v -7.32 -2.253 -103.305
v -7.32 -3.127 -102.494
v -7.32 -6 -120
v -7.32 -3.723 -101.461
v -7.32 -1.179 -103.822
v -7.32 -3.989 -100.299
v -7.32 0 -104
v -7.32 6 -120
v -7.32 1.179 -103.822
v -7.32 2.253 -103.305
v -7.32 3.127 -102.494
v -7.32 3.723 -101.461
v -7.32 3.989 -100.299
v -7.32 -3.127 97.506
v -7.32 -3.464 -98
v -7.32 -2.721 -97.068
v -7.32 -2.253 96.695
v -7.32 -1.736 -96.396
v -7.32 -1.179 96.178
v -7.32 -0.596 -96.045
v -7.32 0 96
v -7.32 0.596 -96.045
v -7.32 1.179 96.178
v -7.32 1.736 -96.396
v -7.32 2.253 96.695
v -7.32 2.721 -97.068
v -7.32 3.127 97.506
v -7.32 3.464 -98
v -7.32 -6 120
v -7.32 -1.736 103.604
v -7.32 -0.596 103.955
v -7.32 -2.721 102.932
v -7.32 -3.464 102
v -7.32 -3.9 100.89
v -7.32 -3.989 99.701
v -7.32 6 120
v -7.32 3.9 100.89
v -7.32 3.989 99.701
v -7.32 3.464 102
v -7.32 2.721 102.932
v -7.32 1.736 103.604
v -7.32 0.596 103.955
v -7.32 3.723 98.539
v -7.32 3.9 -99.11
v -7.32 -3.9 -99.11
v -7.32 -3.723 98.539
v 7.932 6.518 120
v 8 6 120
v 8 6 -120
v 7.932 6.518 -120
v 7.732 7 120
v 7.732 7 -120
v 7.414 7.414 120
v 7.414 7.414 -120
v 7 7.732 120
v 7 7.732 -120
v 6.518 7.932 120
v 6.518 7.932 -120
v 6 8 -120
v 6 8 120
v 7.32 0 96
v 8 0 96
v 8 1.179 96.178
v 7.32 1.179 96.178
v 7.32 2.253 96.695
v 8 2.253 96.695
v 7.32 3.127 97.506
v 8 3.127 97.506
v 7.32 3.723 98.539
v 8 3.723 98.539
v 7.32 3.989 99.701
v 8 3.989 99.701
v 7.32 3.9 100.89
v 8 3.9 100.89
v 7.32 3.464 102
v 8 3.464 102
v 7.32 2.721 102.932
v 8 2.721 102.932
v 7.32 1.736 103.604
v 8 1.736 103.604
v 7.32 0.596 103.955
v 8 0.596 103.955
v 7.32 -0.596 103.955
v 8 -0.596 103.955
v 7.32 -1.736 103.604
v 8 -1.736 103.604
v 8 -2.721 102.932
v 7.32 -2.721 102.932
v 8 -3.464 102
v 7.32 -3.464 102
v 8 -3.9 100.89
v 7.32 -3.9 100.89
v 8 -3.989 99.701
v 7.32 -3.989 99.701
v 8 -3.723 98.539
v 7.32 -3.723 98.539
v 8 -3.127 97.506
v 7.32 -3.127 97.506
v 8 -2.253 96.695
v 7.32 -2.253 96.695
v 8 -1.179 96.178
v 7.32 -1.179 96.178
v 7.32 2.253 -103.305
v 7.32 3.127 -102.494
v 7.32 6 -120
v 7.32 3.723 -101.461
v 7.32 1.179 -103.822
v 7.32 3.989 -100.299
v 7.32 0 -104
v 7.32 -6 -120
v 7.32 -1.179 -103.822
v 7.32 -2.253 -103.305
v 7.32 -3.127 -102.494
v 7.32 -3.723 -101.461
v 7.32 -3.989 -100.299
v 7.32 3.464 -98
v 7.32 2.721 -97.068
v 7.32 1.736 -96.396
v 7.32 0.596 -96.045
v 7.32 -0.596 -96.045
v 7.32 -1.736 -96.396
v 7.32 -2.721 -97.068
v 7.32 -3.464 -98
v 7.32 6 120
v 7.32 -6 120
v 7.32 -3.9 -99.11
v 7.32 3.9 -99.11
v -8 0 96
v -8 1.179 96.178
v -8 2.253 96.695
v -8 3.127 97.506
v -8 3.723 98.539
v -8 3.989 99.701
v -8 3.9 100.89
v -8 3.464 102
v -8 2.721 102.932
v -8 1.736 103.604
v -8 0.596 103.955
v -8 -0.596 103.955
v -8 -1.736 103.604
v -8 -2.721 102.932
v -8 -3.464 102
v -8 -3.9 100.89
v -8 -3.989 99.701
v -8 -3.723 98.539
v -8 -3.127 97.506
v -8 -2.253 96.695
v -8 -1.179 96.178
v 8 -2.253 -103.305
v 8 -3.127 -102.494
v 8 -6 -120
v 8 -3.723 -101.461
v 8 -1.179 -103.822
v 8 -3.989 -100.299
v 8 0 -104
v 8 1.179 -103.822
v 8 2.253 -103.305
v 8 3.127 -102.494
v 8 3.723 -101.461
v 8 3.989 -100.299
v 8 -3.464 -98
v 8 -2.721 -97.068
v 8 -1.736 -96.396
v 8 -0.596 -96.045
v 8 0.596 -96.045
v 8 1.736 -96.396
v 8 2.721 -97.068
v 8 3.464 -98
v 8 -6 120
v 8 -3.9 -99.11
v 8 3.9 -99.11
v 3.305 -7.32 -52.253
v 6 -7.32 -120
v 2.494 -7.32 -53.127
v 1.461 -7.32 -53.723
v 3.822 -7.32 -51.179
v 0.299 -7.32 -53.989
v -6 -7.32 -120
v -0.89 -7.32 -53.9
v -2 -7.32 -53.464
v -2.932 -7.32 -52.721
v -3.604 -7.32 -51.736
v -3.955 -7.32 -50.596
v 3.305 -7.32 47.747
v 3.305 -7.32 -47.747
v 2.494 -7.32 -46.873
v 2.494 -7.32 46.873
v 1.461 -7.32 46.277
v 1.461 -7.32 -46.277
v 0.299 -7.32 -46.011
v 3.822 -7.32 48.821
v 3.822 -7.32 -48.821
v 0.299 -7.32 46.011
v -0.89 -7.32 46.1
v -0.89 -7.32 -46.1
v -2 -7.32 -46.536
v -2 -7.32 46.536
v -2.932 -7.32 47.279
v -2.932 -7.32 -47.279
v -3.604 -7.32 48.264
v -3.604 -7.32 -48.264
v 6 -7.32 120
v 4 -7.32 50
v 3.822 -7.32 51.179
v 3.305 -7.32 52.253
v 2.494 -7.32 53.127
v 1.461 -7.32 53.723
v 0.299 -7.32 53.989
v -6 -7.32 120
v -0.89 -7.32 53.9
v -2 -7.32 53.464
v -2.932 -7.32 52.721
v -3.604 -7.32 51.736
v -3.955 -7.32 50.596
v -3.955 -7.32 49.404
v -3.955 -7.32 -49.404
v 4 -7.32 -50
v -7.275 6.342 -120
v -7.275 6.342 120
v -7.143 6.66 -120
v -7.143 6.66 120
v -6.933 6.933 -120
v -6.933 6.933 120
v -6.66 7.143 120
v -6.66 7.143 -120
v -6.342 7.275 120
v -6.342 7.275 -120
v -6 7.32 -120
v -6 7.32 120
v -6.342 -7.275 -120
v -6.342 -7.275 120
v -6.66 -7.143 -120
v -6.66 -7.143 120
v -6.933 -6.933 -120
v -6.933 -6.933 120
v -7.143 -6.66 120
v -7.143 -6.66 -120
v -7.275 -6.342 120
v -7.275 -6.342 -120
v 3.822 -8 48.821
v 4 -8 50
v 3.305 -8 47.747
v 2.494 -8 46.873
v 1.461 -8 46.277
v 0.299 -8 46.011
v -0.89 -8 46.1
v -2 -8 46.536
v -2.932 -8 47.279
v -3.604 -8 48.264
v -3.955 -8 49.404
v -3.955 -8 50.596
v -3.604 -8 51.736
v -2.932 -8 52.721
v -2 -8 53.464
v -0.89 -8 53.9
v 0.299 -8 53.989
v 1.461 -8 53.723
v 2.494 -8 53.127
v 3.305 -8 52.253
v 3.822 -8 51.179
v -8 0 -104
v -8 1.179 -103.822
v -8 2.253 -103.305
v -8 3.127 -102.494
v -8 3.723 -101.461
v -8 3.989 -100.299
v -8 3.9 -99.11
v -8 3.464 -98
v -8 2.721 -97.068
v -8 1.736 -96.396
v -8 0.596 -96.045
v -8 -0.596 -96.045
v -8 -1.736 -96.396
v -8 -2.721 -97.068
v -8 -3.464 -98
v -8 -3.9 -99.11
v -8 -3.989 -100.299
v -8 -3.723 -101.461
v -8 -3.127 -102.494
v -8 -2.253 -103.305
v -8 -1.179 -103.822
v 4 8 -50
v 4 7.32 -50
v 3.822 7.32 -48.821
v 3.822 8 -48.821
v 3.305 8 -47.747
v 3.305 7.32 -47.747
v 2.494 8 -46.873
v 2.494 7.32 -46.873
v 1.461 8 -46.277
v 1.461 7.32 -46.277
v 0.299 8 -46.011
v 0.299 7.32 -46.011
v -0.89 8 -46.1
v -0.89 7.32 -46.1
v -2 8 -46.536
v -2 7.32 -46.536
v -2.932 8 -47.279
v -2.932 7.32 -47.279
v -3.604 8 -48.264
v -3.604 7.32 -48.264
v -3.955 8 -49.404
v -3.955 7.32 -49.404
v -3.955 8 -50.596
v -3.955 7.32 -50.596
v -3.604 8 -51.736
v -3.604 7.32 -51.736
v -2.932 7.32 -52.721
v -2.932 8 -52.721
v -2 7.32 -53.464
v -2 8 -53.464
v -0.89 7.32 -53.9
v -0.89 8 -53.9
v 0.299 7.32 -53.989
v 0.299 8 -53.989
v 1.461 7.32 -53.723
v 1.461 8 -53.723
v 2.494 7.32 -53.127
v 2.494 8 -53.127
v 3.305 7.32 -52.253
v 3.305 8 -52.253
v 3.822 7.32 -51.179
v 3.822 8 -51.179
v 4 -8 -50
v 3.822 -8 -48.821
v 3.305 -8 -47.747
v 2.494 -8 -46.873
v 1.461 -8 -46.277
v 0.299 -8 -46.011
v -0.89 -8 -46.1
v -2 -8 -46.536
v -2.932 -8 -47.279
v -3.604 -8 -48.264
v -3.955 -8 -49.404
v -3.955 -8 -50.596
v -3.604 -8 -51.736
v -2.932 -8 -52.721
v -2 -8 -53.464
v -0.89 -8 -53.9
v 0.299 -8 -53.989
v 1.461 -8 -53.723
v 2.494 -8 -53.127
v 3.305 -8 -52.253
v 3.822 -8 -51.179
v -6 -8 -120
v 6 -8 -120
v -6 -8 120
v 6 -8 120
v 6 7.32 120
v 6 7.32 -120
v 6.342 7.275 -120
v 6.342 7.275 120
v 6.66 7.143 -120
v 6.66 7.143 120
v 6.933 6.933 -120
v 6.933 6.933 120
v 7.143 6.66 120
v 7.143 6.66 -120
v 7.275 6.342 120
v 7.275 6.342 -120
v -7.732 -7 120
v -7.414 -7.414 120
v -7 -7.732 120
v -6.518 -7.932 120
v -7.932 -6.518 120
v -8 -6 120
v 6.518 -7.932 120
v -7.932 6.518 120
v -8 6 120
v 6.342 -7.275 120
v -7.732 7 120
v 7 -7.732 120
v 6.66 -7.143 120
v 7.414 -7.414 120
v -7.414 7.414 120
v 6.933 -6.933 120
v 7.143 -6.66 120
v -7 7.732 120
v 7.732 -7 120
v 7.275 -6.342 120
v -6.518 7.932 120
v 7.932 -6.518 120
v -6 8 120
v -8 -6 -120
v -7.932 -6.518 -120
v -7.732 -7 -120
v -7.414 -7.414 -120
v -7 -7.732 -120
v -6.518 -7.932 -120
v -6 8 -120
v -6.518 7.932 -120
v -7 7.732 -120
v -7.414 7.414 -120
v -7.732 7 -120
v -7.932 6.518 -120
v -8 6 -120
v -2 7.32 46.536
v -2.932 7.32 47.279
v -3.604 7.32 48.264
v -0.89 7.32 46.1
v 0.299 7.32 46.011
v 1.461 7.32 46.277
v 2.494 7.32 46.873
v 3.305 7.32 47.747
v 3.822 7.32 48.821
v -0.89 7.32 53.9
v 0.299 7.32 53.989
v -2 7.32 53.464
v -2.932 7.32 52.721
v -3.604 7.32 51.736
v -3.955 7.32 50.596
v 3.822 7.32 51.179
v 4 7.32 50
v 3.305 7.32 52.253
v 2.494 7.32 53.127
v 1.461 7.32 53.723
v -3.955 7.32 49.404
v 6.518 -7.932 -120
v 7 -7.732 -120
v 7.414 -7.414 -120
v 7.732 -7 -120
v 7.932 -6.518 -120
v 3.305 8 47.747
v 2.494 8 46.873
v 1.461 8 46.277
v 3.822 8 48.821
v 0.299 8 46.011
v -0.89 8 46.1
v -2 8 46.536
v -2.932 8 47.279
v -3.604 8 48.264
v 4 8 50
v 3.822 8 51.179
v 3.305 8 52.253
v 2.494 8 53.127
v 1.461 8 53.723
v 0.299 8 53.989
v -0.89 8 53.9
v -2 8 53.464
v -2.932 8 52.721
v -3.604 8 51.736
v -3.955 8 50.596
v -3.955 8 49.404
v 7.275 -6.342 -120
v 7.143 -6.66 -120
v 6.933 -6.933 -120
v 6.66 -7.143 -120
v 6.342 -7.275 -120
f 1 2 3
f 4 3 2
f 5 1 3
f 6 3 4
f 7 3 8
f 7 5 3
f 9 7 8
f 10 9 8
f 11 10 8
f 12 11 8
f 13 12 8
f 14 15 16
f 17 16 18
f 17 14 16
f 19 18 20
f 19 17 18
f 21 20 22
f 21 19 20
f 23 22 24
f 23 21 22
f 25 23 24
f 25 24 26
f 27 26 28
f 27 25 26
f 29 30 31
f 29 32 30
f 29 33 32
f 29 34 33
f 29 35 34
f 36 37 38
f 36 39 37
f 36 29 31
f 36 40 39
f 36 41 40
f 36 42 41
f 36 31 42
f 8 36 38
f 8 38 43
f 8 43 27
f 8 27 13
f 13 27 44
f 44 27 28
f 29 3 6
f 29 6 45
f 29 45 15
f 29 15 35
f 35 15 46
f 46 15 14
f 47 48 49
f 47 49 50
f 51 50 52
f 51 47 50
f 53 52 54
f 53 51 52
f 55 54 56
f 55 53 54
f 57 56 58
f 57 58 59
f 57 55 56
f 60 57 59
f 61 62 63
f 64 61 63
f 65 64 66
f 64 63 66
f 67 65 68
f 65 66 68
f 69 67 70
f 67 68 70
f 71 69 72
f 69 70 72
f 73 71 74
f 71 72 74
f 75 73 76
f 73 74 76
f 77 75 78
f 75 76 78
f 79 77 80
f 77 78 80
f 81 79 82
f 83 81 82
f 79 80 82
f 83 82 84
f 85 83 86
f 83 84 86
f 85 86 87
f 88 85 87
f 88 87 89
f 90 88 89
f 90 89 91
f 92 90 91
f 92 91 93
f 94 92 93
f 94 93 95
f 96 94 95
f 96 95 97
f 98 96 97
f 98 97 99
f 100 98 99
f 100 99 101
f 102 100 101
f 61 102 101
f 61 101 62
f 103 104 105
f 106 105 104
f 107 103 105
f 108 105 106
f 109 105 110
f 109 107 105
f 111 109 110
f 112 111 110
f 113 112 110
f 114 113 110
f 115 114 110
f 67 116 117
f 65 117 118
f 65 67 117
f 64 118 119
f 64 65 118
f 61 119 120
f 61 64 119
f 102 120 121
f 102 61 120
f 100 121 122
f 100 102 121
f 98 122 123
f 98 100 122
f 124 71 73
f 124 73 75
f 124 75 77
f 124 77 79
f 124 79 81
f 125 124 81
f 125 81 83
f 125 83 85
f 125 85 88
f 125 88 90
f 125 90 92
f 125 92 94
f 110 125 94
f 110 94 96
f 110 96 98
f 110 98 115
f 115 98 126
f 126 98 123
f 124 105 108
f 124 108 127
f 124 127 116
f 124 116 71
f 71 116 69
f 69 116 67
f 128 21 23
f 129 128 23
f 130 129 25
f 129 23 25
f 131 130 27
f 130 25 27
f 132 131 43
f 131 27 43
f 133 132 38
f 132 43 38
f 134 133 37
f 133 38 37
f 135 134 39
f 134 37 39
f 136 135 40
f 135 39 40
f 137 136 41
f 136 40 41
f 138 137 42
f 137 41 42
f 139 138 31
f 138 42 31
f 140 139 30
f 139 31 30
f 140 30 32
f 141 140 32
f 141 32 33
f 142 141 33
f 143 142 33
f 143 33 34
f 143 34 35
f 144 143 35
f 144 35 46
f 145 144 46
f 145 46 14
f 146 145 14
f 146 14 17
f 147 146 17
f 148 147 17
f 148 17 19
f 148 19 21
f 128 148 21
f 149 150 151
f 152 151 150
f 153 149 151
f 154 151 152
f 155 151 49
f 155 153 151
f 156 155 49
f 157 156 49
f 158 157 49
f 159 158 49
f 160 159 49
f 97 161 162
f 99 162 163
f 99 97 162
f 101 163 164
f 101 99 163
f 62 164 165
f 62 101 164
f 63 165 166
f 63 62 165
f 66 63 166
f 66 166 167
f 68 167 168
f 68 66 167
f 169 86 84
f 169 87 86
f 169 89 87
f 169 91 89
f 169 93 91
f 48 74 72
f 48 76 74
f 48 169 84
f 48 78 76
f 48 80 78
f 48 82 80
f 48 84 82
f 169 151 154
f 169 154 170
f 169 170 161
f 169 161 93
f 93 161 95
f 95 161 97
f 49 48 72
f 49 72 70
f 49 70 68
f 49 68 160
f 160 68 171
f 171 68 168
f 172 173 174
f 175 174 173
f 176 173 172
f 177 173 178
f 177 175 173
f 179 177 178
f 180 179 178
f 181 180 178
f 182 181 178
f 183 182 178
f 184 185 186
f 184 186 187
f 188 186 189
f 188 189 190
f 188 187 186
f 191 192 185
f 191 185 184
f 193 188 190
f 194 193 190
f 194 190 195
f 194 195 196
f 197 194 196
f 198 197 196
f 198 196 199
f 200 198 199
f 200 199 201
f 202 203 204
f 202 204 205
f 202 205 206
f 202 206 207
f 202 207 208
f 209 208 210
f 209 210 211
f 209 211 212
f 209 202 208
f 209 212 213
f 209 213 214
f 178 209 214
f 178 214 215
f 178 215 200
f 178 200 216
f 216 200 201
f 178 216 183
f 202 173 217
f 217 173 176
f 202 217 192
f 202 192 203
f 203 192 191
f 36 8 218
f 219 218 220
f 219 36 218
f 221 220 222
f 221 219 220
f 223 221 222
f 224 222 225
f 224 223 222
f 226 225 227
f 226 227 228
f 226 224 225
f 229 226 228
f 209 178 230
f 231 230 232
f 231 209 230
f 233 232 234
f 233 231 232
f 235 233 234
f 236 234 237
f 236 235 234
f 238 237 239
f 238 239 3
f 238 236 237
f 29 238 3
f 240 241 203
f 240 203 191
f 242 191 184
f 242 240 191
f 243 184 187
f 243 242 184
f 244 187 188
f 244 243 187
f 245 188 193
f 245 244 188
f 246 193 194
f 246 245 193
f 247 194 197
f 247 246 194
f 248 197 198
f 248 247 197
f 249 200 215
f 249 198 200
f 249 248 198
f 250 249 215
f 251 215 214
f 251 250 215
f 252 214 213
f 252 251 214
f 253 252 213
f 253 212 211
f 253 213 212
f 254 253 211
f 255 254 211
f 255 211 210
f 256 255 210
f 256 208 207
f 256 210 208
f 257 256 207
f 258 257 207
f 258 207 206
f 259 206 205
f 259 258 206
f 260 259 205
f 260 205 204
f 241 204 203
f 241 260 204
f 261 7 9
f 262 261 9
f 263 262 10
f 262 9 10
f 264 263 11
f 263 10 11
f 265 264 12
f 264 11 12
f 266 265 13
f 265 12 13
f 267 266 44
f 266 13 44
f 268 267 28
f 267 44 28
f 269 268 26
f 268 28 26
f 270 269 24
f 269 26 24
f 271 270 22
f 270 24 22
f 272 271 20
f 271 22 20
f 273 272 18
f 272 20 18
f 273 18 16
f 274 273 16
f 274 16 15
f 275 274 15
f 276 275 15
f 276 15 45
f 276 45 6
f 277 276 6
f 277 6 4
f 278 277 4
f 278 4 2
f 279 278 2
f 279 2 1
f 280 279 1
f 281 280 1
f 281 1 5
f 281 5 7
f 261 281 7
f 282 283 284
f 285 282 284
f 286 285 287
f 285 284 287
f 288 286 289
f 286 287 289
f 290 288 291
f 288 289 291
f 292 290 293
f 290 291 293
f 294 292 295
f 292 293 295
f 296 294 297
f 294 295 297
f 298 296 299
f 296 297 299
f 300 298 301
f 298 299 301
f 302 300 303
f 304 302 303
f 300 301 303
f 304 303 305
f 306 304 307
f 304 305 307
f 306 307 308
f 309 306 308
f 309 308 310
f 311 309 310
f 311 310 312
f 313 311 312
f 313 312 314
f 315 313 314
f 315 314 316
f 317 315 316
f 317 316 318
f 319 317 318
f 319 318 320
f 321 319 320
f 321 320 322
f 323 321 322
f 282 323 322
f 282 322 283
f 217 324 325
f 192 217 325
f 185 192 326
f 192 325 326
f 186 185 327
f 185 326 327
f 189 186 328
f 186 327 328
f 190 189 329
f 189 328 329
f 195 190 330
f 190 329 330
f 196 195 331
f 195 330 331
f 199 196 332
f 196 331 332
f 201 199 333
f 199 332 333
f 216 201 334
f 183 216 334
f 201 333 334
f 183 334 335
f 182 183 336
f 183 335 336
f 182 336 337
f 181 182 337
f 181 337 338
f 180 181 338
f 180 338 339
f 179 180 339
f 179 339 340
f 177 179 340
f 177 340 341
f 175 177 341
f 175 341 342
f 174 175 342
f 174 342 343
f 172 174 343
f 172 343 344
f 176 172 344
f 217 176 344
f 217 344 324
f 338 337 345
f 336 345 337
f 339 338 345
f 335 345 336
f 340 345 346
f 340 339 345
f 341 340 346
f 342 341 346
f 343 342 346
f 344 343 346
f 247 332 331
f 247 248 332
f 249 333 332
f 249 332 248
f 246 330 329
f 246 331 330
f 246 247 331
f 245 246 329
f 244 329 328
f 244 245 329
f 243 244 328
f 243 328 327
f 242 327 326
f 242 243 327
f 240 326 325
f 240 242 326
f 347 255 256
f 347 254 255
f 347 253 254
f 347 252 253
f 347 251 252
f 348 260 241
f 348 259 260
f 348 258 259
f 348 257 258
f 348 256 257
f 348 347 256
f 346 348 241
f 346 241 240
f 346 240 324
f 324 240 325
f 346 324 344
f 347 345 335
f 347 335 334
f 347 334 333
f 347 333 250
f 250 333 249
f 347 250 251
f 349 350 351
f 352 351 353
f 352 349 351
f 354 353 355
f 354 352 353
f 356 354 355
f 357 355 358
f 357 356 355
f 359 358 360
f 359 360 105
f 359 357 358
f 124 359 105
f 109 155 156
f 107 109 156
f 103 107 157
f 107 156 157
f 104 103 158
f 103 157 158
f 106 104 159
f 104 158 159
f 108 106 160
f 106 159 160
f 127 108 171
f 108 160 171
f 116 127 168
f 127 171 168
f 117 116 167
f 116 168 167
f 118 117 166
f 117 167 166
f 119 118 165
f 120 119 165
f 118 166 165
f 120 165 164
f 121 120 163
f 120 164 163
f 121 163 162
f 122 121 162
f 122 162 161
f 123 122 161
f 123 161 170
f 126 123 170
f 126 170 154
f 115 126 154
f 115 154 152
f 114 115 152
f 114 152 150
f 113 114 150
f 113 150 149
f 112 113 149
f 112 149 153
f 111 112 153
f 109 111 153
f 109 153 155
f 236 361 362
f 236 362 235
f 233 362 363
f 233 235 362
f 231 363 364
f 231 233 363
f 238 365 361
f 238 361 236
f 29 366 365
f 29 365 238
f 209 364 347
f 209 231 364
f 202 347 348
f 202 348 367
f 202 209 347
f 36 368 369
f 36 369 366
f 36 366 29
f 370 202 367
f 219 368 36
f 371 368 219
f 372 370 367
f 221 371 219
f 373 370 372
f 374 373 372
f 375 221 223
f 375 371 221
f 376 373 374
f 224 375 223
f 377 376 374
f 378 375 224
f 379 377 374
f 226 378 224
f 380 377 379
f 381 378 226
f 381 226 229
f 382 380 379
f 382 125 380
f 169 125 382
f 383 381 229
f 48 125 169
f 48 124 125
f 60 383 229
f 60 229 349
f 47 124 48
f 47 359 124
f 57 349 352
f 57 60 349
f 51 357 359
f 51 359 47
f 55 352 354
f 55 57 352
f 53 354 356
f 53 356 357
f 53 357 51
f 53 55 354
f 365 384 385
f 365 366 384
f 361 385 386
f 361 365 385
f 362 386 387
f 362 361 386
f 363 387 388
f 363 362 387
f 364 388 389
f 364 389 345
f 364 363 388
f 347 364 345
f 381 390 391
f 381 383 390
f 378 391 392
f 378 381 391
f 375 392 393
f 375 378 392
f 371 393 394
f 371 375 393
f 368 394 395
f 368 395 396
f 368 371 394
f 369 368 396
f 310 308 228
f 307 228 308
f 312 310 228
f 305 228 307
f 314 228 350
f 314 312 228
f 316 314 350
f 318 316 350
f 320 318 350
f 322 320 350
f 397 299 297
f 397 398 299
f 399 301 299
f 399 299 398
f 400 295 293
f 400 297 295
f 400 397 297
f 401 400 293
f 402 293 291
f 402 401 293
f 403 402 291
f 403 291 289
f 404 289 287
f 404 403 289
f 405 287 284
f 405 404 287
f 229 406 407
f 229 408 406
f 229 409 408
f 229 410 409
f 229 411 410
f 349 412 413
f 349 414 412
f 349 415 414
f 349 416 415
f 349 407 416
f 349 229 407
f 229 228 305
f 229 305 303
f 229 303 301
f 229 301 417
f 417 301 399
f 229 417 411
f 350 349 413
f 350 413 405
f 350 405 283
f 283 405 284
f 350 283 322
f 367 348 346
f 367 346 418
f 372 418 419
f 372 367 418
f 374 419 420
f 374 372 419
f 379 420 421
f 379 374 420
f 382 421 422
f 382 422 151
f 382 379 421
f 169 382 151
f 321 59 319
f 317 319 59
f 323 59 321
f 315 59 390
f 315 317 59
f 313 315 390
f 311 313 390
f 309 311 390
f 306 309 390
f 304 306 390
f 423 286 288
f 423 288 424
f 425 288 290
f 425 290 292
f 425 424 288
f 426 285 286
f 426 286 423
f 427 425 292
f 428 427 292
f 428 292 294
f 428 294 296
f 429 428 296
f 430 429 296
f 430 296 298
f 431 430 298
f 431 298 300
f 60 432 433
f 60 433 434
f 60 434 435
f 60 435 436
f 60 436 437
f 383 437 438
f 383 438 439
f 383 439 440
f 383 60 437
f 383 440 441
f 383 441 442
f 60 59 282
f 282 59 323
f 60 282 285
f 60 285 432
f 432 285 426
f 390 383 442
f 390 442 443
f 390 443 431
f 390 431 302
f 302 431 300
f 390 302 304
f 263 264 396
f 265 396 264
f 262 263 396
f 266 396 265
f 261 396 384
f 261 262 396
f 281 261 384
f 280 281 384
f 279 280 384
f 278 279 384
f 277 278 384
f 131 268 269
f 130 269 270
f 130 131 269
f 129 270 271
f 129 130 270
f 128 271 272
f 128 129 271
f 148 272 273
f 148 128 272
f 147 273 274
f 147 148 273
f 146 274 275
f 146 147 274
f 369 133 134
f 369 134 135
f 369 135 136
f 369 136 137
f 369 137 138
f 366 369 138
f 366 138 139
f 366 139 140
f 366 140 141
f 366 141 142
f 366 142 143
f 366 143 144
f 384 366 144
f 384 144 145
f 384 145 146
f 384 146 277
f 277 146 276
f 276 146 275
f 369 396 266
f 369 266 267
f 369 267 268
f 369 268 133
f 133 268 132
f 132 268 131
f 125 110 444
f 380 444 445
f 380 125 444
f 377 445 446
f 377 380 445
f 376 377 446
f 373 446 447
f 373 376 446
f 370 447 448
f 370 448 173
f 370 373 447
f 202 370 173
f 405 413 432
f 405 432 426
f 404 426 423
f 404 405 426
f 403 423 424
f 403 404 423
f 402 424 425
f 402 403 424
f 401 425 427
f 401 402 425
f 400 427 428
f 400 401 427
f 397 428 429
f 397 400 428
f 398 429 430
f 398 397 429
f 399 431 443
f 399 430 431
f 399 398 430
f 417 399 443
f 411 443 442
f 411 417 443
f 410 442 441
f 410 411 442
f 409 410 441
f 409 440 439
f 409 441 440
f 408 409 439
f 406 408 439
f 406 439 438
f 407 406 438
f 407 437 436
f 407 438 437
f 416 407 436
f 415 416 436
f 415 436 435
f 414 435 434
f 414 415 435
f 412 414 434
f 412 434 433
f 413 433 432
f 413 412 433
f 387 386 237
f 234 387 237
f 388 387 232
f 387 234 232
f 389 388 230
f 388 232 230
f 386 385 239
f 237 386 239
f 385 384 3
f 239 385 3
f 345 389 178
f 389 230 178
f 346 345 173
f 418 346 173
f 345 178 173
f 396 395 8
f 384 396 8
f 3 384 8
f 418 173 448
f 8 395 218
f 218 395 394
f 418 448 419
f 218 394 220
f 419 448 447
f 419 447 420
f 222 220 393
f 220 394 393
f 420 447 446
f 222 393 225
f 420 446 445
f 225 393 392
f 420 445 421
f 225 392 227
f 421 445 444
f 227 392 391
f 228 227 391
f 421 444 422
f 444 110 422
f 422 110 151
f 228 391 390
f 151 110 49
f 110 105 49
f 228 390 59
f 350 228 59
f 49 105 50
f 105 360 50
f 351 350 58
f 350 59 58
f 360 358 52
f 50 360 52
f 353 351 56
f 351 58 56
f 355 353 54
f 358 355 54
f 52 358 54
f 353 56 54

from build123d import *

# Parameters (mm, degrees)
BOSS_EXTRUDE1_DEPTH      = 120
BOSS_EXTRUDE1_DEPTH_BACK = 120
CUT_EXTRUDE1_START       = -17
SKETCH2_R                = 4
CUT_EXTRUDE1_DEPTH       = 18
SKETCH3_R                = 4
CUT_EXTRUDE2_DEPTH       = 1
CUT_EXTRUDE2_DEPTH_BACK  = 17


with BuildPart() as part:
    # Sketch1 → Boss-Extrude1 (new body, two sides)
    with BuildSketch(Plane.XY) as boss_extrude1_sk:
        with BuildLine():
            Line((-6, -8), (6, -8))
            ThreePointArc((6, -8), (7.414213562, -7.414213562), (8, -6))
            Line((8, -6), (8, 6))
            ThreePointArc((8, 6), (7.414213562, 7.414213562), (6, 8))
            Line((6, 8), (-6, 8))
            ThreePointArc((-6, 8), (-7.414213562, 7.414213562), (-8, 6))
            Line((-8, 6), (-8, -6))
            ThreePointArc((-8, -6), (-7.414213562, -7.414213562), (-6, -8))
        make_face()
        with BuildLine():
            Line((-6, 7.32), (6, 7.32))
            ThreePointArc((6, 7.32), (6.933380951, 6.933380951), (7.32, 6))
            Line((7.32, 6), (7.32, -6))
            ThreePointArc((7.32, -6), (6.933380951, -6.933380951), (6, -7.32))
            Line((6, -7.32), (-6, -7.32))
            ThreePointArc((-6, -7.32), (-6.933380951, -6.933380951), (-7.32, -6))
            Line((-7.32, -6), (-7.32, 6))
            ThreePointArc((-7.32, 6), (-6.933380951, 6.933380951), (-6, 7.32))
        make_face(mode=Mode.SUBTRACT)
    extrude(amount=BOSS_EXTRUDE1_DEPTH)
    extrude(boss_extrude1_sk.sketch, amount=-BOSS_EXTRUDE1_DEPTH_BACK)

    # Sketch2 → Cut-Extrude1 (cut)
    with BuildSketch(Plane(origin=(0, 8, 0), x_dir=(1, 0, 0), z_dir=(0, 1, 0)).offset(CUT_EXTRUDE1_START)):
        with Locations((0, -50)):
            Circle(SKETCH2_R)
    cut_extrude1 = extrude(amount=CUT_EXTRUDE1_DEPTH, mode=Mode.SUBTRACT)

    # Mirror1: Cut-Extrude1 across plane
    add(cut_extrude1.mirror(Plane.XY), mode=Mode.SUBTRACT)

    # Sketch3 → Cut-Extrude2 (cut, two sides)
    with BuildSketch(Plane(origin=(8, 0, 0), x_dir=(0, 0, -1), z_dir=(1, 0, 0))) as cut_extrude2_sk:
        with Locations((-100, 0)):
            Circle(SKETCH3_R)
        with Locations((100, 0)):
            Circle(SKETCH3_R)
    extrude(amount=CUT_EXTRUDE2_DEPTH, mode=Mode.SUBTRACT)
    extrude(cut_extrude2_sk.sketch, amount=-CUT_EXTRUDE2_DEPTH_BACK, mode=Mode.SUBTRACT)


solid = part.part
